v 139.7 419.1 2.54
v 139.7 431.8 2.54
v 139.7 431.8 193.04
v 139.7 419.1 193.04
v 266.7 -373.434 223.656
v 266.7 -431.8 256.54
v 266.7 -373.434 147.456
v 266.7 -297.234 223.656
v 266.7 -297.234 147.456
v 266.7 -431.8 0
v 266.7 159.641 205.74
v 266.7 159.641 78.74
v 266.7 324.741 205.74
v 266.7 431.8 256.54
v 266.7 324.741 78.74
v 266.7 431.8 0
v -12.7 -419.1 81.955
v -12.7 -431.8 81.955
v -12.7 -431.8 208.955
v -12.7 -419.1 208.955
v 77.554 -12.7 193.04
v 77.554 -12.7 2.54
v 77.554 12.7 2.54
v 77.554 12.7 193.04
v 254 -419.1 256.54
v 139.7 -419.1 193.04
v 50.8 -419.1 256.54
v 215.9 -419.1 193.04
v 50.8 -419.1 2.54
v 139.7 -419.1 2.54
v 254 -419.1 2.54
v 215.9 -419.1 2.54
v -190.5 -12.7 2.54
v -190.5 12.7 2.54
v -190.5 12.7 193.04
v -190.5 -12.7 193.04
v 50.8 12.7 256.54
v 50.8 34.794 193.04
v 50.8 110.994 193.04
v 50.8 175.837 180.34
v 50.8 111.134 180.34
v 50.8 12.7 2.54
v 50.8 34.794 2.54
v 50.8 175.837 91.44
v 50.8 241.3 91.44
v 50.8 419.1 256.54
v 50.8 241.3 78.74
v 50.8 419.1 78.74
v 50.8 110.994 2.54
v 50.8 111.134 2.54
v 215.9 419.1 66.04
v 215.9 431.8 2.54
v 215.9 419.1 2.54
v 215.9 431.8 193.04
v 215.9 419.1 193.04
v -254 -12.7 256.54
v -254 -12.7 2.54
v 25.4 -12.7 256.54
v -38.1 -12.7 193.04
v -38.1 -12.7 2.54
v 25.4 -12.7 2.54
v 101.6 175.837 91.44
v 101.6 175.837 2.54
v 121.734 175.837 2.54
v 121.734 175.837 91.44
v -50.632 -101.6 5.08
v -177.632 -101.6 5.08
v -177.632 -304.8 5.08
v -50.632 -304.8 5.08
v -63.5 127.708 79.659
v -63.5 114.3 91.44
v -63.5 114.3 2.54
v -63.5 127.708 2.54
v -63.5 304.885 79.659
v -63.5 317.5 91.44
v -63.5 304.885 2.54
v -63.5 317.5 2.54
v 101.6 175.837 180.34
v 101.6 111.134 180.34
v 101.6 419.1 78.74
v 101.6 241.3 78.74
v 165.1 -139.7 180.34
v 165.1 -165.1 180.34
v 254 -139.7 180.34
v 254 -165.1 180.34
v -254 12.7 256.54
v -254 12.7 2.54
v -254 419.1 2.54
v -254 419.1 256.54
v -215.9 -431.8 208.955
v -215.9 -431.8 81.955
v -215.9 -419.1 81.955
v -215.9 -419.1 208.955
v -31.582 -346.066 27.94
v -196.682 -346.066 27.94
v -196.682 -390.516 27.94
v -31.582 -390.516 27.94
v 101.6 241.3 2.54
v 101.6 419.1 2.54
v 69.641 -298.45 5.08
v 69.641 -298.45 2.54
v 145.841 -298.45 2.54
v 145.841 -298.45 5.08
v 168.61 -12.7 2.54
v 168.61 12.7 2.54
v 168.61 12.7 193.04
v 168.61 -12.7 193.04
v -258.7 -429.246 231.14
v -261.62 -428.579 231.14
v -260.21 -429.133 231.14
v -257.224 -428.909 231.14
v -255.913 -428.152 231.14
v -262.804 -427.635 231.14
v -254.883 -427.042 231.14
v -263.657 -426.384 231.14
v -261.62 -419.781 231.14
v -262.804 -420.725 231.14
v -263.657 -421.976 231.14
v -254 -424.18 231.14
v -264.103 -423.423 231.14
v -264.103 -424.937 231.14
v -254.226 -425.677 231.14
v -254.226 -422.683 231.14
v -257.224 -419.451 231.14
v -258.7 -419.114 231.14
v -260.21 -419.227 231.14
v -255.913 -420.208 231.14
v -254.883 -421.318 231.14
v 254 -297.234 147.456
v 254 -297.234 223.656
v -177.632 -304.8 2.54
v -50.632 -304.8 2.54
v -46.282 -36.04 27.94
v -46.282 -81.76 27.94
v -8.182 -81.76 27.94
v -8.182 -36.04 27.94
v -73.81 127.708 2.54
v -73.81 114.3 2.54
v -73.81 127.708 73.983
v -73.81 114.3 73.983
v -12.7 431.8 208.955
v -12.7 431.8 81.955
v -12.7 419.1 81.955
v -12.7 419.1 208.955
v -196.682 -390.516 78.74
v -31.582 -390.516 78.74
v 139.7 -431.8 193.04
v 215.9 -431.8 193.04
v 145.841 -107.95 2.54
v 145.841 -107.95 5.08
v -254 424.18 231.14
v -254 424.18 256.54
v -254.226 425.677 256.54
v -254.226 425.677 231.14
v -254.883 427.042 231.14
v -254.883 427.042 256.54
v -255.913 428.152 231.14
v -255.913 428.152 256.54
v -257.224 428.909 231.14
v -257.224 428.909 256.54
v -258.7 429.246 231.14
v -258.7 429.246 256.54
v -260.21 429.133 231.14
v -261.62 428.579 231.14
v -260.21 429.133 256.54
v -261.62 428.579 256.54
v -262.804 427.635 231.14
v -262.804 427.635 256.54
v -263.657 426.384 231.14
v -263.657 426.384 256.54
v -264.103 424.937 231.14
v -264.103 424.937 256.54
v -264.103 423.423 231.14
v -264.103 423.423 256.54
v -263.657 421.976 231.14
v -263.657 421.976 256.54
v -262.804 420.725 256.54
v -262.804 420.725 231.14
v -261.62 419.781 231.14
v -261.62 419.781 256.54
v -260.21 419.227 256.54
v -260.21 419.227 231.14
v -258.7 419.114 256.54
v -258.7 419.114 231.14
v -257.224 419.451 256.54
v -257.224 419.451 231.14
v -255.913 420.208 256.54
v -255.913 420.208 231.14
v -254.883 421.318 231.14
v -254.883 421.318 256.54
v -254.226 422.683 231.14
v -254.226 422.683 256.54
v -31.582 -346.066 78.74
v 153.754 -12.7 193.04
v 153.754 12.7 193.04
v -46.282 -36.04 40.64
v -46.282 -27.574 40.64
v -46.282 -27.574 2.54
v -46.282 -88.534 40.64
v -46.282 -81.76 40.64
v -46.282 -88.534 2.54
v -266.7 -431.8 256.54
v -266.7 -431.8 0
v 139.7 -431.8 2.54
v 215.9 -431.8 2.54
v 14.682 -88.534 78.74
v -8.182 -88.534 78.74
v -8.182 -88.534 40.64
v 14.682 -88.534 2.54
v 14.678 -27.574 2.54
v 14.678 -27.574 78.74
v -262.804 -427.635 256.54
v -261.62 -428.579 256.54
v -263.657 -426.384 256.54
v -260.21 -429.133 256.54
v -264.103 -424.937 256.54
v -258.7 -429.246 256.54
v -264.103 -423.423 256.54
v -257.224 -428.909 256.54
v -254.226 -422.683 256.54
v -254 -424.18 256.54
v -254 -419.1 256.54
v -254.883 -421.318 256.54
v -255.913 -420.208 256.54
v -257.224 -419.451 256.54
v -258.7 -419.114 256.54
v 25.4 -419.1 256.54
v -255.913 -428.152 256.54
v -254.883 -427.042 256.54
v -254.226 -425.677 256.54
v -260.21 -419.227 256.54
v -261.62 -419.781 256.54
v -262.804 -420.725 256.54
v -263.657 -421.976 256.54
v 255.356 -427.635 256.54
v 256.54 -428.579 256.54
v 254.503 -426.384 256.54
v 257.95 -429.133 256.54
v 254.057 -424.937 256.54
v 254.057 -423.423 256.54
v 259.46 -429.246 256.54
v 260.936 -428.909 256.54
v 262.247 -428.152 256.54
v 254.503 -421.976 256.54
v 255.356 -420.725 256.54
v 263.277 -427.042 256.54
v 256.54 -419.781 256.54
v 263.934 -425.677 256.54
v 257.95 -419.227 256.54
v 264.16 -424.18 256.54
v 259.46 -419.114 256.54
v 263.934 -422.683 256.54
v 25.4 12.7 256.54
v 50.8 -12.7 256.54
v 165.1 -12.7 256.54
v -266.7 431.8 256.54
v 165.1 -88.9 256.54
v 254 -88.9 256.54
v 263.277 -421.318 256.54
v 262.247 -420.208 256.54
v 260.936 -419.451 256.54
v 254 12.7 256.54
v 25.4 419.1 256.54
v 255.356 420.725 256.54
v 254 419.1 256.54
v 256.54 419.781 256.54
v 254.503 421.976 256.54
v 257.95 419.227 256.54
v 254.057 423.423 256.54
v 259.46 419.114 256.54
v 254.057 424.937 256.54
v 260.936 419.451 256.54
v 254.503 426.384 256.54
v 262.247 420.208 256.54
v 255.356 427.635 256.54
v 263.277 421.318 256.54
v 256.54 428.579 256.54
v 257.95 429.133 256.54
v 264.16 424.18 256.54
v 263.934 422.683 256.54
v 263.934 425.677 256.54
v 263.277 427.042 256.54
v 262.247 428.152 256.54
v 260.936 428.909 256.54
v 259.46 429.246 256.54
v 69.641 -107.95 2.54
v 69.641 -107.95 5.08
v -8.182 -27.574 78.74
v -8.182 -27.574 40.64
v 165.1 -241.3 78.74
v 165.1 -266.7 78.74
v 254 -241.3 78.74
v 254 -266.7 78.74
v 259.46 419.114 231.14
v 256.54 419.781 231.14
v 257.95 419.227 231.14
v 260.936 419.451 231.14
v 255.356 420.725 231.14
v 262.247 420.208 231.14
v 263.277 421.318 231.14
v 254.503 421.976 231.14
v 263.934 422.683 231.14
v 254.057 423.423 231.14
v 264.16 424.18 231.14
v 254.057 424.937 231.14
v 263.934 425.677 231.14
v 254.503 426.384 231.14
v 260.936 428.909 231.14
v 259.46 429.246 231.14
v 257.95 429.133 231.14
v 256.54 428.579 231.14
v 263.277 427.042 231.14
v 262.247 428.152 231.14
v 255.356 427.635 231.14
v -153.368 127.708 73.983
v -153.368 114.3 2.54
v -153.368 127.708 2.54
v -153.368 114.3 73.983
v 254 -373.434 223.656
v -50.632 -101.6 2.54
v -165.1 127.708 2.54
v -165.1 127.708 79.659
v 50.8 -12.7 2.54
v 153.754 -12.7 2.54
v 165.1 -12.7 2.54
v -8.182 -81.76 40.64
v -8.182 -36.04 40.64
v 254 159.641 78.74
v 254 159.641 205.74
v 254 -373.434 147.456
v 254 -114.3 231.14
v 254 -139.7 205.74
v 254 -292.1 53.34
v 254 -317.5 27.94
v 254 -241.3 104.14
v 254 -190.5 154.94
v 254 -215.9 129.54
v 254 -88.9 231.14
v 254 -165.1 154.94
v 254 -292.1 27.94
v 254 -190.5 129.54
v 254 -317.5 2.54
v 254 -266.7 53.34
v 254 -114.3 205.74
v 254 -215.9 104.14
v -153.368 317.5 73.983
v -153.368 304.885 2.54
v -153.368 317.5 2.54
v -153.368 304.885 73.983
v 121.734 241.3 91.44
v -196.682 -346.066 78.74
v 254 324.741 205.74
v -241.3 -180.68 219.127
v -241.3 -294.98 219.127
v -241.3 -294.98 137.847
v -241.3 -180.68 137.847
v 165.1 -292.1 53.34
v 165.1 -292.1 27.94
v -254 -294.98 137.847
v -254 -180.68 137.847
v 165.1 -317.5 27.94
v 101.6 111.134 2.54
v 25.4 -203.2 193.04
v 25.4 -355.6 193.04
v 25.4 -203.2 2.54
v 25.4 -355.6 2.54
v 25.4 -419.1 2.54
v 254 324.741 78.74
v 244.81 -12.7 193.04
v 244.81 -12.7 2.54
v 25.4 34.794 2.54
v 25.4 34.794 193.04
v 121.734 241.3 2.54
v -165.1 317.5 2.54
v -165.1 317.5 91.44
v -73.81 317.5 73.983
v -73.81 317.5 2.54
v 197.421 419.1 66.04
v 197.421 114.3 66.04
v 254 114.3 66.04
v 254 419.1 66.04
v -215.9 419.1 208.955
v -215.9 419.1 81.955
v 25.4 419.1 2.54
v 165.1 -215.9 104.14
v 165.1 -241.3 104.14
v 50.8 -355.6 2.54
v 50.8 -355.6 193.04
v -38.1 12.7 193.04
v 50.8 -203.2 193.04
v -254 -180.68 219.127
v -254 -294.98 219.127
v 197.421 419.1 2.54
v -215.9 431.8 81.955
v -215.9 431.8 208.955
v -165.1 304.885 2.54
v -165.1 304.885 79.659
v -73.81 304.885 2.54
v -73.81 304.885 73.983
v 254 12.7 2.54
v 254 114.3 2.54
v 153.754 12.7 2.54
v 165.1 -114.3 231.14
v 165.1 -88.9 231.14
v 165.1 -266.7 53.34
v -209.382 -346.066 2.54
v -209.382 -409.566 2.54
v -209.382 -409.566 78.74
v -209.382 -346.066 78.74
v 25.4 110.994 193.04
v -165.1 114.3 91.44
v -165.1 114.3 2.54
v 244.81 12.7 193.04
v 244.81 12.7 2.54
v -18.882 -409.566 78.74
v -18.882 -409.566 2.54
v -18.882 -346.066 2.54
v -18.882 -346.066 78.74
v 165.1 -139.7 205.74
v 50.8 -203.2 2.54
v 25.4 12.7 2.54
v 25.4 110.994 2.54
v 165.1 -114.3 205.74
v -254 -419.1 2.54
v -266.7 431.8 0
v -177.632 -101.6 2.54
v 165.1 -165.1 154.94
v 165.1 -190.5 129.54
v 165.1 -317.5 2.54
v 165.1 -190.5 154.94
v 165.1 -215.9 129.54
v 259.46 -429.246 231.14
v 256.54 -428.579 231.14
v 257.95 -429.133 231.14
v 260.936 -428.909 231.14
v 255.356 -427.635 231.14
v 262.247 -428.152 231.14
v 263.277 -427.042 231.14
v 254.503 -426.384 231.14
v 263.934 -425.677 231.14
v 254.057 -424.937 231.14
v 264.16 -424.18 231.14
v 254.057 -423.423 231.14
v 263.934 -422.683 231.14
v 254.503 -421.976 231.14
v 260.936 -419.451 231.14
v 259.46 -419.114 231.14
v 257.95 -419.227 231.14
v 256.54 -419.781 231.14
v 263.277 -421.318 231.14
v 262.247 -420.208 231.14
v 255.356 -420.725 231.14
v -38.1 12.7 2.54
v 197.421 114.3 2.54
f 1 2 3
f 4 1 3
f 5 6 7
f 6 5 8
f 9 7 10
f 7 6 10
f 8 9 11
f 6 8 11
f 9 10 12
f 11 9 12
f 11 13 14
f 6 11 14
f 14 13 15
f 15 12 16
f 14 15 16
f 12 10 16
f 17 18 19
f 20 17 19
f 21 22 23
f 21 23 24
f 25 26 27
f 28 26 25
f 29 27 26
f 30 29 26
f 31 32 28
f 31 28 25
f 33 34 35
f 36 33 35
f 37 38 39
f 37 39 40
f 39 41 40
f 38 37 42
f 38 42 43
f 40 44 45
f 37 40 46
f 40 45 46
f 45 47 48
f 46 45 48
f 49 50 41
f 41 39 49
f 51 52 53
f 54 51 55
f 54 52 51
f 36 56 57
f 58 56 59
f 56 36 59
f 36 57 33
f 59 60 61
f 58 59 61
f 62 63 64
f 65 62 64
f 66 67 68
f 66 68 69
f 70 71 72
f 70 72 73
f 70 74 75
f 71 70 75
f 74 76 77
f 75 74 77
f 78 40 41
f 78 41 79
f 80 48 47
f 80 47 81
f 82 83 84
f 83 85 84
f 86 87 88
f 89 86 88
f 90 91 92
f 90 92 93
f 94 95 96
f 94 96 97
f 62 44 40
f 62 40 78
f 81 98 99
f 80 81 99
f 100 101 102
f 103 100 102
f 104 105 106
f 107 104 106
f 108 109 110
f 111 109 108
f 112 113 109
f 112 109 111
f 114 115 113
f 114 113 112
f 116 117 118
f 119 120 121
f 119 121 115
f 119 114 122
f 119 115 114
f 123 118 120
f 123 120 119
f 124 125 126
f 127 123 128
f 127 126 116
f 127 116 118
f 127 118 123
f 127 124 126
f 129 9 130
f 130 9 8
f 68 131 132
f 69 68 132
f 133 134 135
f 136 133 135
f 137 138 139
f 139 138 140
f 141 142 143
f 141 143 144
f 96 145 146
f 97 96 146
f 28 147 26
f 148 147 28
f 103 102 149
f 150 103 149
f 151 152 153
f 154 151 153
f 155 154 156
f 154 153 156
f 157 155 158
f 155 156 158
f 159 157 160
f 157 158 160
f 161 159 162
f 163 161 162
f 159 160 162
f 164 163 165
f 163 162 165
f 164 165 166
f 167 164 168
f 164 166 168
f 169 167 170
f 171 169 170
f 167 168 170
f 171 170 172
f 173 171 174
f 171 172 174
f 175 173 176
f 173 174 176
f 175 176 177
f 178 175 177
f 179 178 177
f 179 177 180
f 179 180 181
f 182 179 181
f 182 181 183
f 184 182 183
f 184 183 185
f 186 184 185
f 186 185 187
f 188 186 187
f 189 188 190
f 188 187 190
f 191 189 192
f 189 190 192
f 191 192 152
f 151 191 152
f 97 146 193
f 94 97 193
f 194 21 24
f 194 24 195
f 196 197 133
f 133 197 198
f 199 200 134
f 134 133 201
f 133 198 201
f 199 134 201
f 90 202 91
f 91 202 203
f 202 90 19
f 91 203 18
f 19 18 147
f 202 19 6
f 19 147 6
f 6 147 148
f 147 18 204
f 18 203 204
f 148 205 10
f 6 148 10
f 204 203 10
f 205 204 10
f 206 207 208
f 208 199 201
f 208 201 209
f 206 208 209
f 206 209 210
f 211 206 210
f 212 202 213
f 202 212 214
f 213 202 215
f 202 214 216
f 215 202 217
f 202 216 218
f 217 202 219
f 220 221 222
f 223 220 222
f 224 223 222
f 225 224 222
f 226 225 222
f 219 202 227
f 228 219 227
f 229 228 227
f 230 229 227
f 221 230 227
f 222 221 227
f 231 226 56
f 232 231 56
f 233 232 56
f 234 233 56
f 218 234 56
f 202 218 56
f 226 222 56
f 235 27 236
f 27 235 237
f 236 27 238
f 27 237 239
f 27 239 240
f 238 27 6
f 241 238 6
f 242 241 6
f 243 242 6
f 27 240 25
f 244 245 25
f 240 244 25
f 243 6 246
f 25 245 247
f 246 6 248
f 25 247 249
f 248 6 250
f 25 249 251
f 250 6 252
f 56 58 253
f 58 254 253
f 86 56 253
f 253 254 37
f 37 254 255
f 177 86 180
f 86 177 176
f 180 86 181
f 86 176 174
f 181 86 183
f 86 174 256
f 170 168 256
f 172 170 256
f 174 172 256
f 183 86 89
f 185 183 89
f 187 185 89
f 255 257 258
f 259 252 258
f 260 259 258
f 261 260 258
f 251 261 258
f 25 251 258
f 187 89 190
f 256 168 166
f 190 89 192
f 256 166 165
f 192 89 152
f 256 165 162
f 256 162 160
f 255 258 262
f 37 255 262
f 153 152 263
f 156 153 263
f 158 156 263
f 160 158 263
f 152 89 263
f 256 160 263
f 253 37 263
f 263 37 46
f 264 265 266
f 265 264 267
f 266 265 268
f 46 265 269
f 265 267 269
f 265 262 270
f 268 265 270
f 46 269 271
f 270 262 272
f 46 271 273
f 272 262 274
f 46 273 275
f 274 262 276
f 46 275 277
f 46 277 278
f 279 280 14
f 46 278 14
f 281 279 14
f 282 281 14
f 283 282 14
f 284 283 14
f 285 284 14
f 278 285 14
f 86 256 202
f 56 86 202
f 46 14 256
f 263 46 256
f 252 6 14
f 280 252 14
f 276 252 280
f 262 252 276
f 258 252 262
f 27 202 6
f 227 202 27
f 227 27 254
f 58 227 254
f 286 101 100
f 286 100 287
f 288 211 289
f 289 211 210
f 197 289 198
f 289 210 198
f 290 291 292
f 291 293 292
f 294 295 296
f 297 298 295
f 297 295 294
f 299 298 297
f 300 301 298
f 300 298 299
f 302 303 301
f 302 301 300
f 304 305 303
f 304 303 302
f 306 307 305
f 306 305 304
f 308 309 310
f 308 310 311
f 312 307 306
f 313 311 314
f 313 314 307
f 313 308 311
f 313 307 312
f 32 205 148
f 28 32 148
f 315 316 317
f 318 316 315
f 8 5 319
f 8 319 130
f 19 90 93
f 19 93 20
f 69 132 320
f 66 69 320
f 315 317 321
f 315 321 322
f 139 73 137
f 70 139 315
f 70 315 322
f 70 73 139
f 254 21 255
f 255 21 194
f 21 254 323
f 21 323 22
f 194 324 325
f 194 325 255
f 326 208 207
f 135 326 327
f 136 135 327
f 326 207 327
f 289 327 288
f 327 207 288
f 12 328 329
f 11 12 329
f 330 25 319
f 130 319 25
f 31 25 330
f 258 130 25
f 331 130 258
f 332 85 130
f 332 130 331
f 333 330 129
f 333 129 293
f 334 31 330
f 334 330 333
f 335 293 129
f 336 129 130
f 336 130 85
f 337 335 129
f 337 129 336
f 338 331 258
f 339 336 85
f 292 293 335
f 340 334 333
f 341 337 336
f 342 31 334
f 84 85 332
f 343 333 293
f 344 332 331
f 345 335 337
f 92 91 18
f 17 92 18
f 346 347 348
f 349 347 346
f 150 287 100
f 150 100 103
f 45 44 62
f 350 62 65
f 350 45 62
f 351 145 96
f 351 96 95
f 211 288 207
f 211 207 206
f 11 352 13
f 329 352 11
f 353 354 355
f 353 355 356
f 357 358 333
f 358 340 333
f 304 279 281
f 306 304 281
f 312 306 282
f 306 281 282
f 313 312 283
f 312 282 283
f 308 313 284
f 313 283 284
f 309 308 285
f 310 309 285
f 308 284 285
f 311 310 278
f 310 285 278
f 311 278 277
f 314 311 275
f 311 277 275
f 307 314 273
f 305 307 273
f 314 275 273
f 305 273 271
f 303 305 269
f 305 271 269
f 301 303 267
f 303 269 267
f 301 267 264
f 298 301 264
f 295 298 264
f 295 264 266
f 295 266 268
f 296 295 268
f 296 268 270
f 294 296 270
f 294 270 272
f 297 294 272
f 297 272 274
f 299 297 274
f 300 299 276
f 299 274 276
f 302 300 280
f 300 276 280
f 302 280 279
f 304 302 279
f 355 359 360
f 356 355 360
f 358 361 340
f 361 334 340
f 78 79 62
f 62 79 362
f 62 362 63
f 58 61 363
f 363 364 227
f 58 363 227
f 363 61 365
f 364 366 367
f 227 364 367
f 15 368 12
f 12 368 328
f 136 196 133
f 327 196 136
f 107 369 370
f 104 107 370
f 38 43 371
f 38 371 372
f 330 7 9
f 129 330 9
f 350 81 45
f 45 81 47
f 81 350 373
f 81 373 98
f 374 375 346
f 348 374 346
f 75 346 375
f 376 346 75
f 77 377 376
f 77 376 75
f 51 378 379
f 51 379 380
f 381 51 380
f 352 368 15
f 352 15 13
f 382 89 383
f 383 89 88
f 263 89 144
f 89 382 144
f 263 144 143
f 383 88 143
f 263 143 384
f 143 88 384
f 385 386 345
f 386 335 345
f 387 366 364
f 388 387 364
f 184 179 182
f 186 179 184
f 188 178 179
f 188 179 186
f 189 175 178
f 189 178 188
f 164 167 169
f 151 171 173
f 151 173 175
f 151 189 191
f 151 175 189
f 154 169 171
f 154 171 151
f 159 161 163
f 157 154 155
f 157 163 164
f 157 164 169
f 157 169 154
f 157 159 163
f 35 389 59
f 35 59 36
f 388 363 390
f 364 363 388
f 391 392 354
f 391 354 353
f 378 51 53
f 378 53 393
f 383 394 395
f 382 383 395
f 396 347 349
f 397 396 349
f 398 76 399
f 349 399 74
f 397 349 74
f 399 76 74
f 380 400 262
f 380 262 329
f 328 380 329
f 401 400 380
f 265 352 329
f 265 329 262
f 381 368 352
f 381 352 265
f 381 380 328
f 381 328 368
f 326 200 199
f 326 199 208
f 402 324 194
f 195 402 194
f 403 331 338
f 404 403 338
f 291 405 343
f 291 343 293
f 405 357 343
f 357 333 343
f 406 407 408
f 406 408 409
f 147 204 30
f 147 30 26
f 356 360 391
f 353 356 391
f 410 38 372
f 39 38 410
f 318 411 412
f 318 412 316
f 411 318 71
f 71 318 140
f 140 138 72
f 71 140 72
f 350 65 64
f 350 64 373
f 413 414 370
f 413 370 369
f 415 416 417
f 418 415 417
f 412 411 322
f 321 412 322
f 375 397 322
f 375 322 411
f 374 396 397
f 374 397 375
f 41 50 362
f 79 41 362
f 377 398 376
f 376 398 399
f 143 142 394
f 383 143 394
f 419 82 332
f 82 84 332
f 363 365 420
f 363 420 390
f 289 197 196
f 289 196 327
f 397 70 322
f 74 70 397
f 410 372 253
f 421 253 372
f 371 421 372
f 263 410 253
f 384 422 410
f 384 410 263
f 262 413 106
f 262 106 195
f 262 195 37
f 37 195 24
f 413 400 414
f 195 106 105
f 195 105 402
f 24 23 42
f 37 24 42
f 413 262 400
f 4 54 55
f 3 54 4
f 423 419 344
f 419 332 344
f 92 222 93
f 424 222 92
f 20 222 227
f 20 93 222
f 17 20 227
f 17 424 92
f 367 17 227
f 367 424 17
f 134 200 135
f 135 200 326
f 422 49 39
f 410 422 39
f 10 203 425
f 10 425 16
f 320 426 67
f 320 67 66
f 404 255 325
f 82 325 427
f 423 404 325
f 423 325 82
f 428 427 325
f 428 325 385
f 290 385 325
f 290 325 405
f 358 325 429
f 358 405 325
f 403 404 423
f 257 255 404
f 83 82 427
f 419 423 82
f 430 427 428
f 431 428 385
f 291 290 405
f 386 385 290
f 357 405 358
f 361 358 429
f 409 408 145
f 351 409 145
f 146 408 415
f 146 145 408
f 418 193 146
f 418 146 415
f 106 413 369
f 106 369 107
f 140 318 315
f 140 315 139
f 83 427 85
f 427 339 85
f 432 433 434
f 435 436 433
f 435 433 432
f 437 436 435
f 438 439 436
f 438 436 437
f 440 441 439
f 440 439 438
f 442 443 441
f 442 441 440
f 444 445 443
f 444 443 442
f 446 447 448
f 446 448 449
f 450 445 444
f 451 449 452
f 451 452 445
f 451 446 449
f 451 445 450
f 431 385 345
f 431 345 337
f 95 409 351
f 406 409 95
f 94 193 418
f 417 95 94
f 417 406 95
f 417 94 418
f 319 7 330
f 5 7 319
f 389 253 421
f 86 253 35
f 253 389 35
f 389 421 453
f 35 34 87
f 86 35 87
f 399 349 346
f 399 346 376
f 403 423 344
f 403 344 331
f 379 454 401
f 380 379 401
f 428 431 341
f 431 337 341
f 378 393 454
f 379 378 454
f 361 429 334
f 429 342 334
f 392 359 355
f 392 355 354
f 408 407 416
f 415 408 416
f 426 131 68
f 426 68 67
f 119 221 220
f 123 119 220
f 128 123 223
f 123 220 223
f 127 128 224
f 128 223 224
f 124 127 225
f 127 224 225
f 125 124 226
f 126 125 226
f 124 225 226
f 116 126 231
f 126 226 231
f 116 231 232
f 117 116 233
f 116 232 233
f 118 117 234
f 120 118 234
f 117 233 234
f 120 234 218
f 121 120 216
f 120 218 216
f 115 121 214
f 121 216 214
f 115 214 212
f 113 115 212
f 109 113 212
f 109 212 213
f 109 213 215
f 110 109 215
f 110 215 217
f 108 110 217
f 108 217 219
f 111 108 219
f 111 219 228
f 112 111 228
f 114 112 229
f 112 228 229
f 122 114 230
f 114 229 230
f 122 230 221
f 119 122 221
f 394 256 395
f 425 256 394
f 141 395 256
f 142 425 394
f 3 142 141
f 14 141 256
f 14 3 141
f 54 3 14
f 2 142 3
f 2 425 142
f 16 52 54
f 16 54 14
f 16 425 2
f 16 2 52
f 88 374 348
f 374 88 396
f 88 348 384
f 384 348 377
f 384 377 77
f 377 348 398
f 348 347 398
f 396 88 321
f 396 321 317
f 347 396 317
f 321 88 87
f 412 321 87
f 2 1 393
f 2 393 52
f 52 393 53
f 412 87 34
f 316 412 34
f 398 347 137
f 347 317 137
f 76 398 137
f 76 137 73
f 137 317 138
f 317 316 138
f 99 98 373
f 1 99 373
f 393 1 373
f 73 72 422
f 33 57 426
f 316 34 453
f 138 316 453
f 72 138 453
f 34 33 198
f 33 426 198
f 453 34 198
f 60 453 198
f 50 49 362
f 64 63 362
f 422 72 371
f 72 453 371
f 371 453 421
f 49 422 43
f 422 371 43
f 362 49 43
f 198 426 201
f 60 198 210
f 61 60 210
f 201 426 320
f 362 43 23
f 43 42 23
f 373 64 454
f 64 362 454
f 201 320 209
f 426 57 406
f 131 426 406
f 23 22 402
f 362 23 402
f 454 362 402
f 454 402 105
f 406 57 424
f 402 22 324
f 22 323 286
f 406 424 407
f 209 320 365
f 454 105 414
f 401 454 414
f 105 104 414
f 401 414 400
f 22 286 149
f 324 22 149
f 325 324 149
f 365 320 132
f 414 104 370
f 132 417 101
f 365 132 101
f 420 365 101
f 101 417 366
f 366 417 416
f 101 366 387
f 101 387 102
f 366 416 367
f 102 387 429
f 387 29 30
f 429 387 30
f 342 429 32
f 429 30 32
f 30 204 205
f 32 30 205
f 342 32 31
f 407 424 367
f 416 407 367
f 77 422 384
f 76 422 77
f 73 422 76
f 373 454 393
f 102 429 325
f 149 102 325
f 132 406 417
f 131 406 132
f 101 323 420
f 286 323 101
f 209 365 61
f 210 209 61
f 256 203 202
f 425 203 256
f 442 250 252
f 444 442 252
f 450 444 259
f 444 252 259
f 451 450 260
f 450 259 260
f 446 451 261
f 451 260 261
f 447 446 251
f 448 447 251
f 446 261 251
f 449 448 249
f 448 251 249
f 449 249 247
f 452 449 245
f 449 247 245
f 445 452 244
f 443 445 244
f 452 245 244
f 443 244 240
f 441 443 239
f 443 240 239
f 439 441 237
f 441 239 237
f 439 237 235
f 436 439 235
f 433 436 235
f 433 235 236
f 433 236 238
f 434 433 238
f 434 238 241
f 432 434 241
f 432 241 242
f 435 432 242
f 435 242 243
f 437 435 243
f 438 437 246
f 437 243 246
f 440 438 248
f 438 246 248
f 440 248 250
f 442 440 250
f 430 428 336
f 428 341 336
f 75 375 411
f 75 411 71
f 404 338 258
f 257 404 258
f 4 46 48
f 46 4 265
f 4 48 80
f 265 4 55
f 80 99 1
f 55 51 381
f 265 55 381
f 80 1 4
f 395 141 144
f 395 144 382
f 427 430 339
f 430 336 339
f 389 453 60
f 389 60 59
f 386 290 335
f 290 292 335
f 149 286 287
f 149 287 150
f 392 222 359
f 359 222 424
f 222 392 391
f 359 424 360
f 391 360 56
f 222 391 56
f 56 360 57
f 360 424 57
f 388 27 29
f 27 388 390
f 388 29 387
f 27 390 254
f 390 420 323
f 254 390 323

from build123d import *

# Parameters (mm, degrees)
F0_W      = 533.4
F0_H      = 863.6
F1_DEPTH  = 2.54
F2_W      = 533.4
F2_H      = 863.6
F2_W_2    = 508
F2_H_2    = 838.2
F3_DEPTH  = 254
F4_W      = 25.4
F4_H      = 406.4
F4_H_2    = 25.4
F5_DEPTH  = 254
F6_W      = 76.2
F6_H      = 190.5
F7_DEPTH  = 25.4
F8_W      = 76.2
F8_H      = 304.8
F9_DEPTH  = 25.4
F10_W     = 76.2
F10_H     = 279.4
F11_DEPTH = 25.4
F12_W     = 76.2
F12_H     = 254
F13_DEPTH = 25.4
F14_W     = 76.2
F14_H     = 228.6
F15_DEPTH = 25.4
F16_W     = 76.2
F16_H     = 203.2
F17_DEPTH = 25.4
F18_W     = 76.2
F18_H     = 177.8
F19_DEPTH = 25.4
F20_W     = 76.2
F20_H     = 152.4
F21_DEPTH = 25.4
F22_W     = 76.2
F22_H     = 127
F23_DEPTH = 25.4
F24_W     = 76.2
F24_H     = 101.6
F25_DEPTH = 25.4
F26_W     = 76.2
F26_H     = 76.2
F27_DEPTH = 25.4
F28_W     = 76.2
F28_H     = 190.5
F29_DEPTH = 25.4
F30_W     = 76.2
F30_H     = 190.5
F31_DEPTH = 25.4
F32_W     = 152.4
F32_H     = 190.5
F33_DEPTH = 25.4
F34_W     = 152.4
F34_H     = 190.5
F35_DEPTH = 25.4
F37_W     = 76.2
F37_H     = 76.2
F38_DEPTH = 25.4
F39_W     = 203.2
F39_H     = 127
F40_DEPTH = 25.4
F41_W     = 203.2
F41_H     = 127
F42_DEPTH = 25.4
F43_W     = 76.2
F43_H     = 190.5
F44_DEPTH = 25.4
F45_W     = 76.2
F45_H     = 190.5
F46_DEPTH = 25.4
F48_DEPTH = 12.7
F49_W     = 165.1
F49_H     = 127
F50_DEPTH = 25.4
F51_R     = 5.08
F52_DEPTH = 25.4
F53_W     = 190.5
F53_H     = 63.5
F54_DEPTH = 76.2
F55_W     = 165.1
F55_H     = 44.45
F56_DEPTH = 50.8
F57_W     = 127
F57_H     = 203.2
F57_W_2   = 76.2
F57_H_2   = 190.5
F58_DEPTH = 2.54
F60_DEPTH = 63.5
F61_W     = 50.8
F61_H     = 177.8
F62_DEPTH = 76.2
F64_DEPTH = 88.9
F65_W     = 50.8
F65_H     = 64.7032260895
F66_DEPTH = 177.8
F67_W     = 101.6
F67_H     = 203.2
F68_DEPTH = 88.9
F69_W     = 79.5584097505
F69_H     = 71.4426783538
F70_DEPTH = 203.2
F71_W     = 177.1770715714
F71_H     = 77.1189329839
F72_DEPTH = 101.6
F73_W     = 114.3
F73_H     = 81.28
F74_DEPTH = 12.7
F76_DEPTH = 76.2
F77_W     = 38.1
F77_H     = 45.72
F78_DEPTH = 50.8
F79_W     = 38.1
F79_H     = 8.466582
F79_H_2   = 6.773418
F80_DEPTH = 38.1


with BuildPart() as f1:
    # F0 (on Top) → F1 (new body)
    with BuildSketch(Plane.XY):
        Rectangle(F0_W, F0_H)
    extrude(amount=F1_DEPTH)

    # F2 (on face) → F3 (join)
    with BuildSketch(Plane.XY.offset(2.54)):
        Rectangle(F2_W, F2_H)
        Rectangle(F2_W_2, F2_H_2, mode=Mode.SUBTRACT)
    extrude(amount=F3_DEPTH)

    # F4 (on face) → F5 (join)
    with BuildSketch(Plane.XY.offset(2.54)):
        with Locations((38.1, -215.9)):
            Rectangle(F4_W, F4_H)
        with Locations((38.1, 0)):
            Rectangle(F4_W, F4_H_2)
        Polygon((254, 12.7), (50.8, 12.7), (50.8, -12.7), (254, -12.7), (254, 0), align=None)
        Polygon((25.4, -12.7), (25.4, 12.7), (-254, 12.7), (-254, 0), (-254, -12.7), align=None)
        with Locations((38.1, 215.9)):
            Rectangle(F4_W, F4_H)
    extrude(amount=F5_DEPTH)

    # F6 (on face) → F7 (cut)
    with BuildSketch(Plane.XZ.offset(431.8)):
        with Locations((177.8, 97.79)):
            Rectangle(F6_W, F6_H)
    extrude(amount=-F7_DEPTH, mode=Mode.SUBTRACT)

    # F8 (on face) → F9 (join)
    with BuildSketch(Plane.XY.offset(2.54)):
        with Locations((215.9, -165.1)):
            Rectangle(F8_W, F8_H)
    extrude(amount=F9_DEPTH)

    # F10 (on face) → F11 (join)
    with BuildSketch(Plane.XY.offset(27.94)):
        with Locations((215.9, -152.4)):
            Rectangle(F10_W, F10_H)
    extrude(amount=F11_DEPTH)

    # F12 (on face) → F13 (join)
    with BuildSketch(Plane.XY.offset(53.34)):
        with Locations((215.9, -139.7)):
            Rectangle(F12_W, F12_H)
    extrude(amount=F13_DEPTH)

    # F14 (on face) → F15 (join)
    with BuildSketch(Plane.XY.offset(78.74)):
        with Locations((215.9, -127)):
            Rectangle(F14_W, F14_H)
    extrude(amount=F15_DEPTH)

    # F16 (on face) → F17 (join)
    with BuildSketch(Plane.XY.offset(104.14)):
        with Locations((215.9, -114.3)):
            Rectangle(F16_W, F16_H)
    extrude(amount=F17_DEPTH)

    # F18 (on face) → F19 (join)
    with BuildSketch(Plane.XY.offset(129.54)):
        with Locations((215.9, -101.6)):
            Rectangle(F18_W, F18_H)
    extrude(amount=F19_DEPTH)

    # F20 (on face) → F21 (join)
    with BuildSketch(Plane.XY.offset(154.94)):
        with Locations((215.9, -88.9)):
            Rectangle(F20_W, F20_H)
    extrude(amount=F21_DEPTH)

    # F22 (on face) → F23 (join)
    with BuildSketch(Plane.XY.offset(180.34)):
        with Locations((215.9, -76.2)):
            Rectangle(F22_W, F22_H)
    extrude(amount=F23_DEPTH)

    # F24 (on face) → F25 (join)
    with BuildSketch(Plane.XY.offset(205.74)):
        with Locations((215.9, -63.5)):
            Rectangle(F24_W, F24_H)
    extrude(amount=F25_DEPTH)

    # F26 (on face) → F27 (join)
    with BuildSketch(Plane.XY.offset(231.14)):
        with Locations((215.9, -50.8)):
            Rectangle(F26_W, F26_H)
    extrude(amount=F27_DEPTH)

    # F28 (on face) → F29 (cut)
    with BuildSketch(Plane.XZ.offset(12.7)):
        with Locations((115.6540173054, 97.79)):
            Rectangle(F28_W, F28_H)
    extrude(amount=-F29_DEPTH, mode=Mode.SUBTRACT)

    # F30 (on face) → F31 (cut)
    with BuildSketch(Plane.YZ.offset(50.8)):
        with Locations((72.8943343222, 97.79)):
            Rectangle(F30_W, F30_H)
    extrude(amount=-F31_DEPTH, mode=Mode.SUBTRACT)

    # F32 (on face) → F33 (cut)
    with BuildSketch(Plane(origin=(0, 12.7, 0), x_dir=(-1, 0, 0), z_dir=(0, 1, 0))):
        with Locations((114.3, 97.79)):
            Rectangle(F32_W, F32_H)
    extrude(amount=-F33_DEPTH, mode=Mode.SUBTRACT)

    # F34 (on face) → F35 (cut)
    with BuildSketch(Plane(origin=(25.4, 0, 0), x_dir=(0, -1, 0), z_dir=(-1, 0, 0))):
        with Locations((279.4, 97.79)):
            Rectangle(F34_W, F34_H)
    extrude(amount=-F35_DEPTH, mode=Mode.SUBTRACT)

    # F37 (on face) → F38 (cut)
    with BuildSketch(Plane.YZ.offset(266.7)):
        with Locations((-335.3340667725, 185.5564373493)):
            Rectangle(F37_W, F37_H)
    extrude(amount=-F38_DEPTH, mode=Mode.SUBTRACT)

    # F39 (on face) → F40 (cut)
    with BuildSketch(Plane.XZ.offset(431.8)):
        with Locations((-114.3, 145.4548070431)):
            Rectangle(F39_W, F39_H)
    extrude(amount=-F40_DEPTH, mode=Mode.SUBTRACT)

    # F41 (on face) → F42 (cut)
    with BuildSketch(Plane(origin=(0, 431.8, 0), x_dir=(-1, 0, 0), z_dir=(0, 1, 0))):
        with Locations((114.3, 145.4548070431)):
            Rectangle(F41_W, F41_H)
    extrude(amount=-F42_DEPTH, mode=Mode.SUBTRACT)

    # F43 (on face) → F44 (cut)
    with BuildSketch(Plane(origin=(0, 431.8, 0), x_dir=(-1, 0, 0), z_dir=(0, 1, 0))):
        with Locations((-177.8, 97.79)):
            Rectangle(F43_W, F43_H)
    extrude(amount=-F44_DEPTH, mode=Mode.SUBTRACT)

    # F45 (on face) → F46 (cut)
    with BuildSketch(Plane(origin=(0, 12.7, 0), x_dir=(-1, 0, 0), z_dir=(0, 1, 0))):
        with Locations((-206.7097020388, 97.79)):
            Rectangle(F45_W, F45_H)
    extrude(amount=-F46_DEPTH, mode=Mode.SUBTRACT)

    # F47 (on face) → F48 (join)
    with BuildSketch(Plane(origin=(177.8, 0, 0), x_dir=(0, -1, 0), z_dir=(-1, 0, 0))):
        Polygon((88.9, 231.14), (88.9, 256.54), (12.7, 256.54), (12.7, 193.04), (12.7, 2.54), (317.5, 2.54), (317.5, 27.94), (292.1, 27.94), (292.1, 53.34), (266.7, 53.34), (266.7, 78.74), (241.3, 78.74), (241.3, 104.14), (215.9, 104.14), (215.9, 129.54), (190.5, 129.54), (190.5, 154.94), (165.1, 154.94), (165.1, 180.34), (139.7, 180.34), (139.7, 205.74), (114.3, 205.74), (114.3, 231.14), align=None)
    extrude(amount=F48_DEPTH)

    # F49 (on face) → F50 (cut)
    with BuildSketch(Plane(origin=(254, 0, 0), x_dir=(0, -1, 0), z_dir=(-1, 0, 0))):
        with Locations((-242.1909462929, 142.24)):
            Rectangle(F49_W, F49_H)
    extrude(amount=-F50_DEPTH, mode=Mode.SUBTRACT)

    # F51 (on face) → F52 (cut)
    with BuildSketch(Plane.XY.offset(256.54)):
        with Locations((259.08, -424.18)):
            Circle(F51_R)
        with Locations((-259.08, -424.18)):
            Circle(F51_R)
        with Locations((-259.08, 424.18)):
            Circle(F51_R)
        with Locations((259.08, 424.18)):
            Circle(F51_R)
    extrude(amount=-F52_DEPTH, mode=Mode.SUBTRACT)

    # F53 (on face) → F54 (join)
    with BuildSketch(Plane.XY.offset(2.54)):
        with Locations((-114.1317740679, -377.8158957958)):
            Rectangle(F53_W, F53_H)
    extrude(amount=F54_DEPTH)

    # F55 (on face) → F56 (cut)
    with BuildSketch(Plane.XY.offset(78.74)):
        with Locations((-114.1317740679, -368.2908957958)):
            Rectangle(F55_W, F55_H)
    extrude(amount=-F56_DEPTH, mode=Mode.SUBTRACT)

    # F57 (on face) → F58 (join)
    with BuildSketch(Plane.XY.offset(2.54)):
        with Locations((-114.1317740679, -203.2)):
            Rectangle(F57_W, F57_H)
        with Locations((107.7413304009, -203.2)):
            Rectangle(F57_W_2, F57_H_2)
    extrude(amount=F58_DEPTH)

    # F59 (on face) → F60 (join)
    with BuildSketch(Plane.XY.offset(2.54)):
        Polygon((215.9, 419.1), (197.4212676287, 419.1), (197.4212676287, 114.3), (254, 114.3), (254, 419.1), align=None)
    extrude(amount=F60_DEPTH)

    # F61 (on face) → F62 (join)
    with BuildSketch(Plane.XY.offset(2.54)):
        with Locations((76.2, 330.2)):
            Rectangle(F61_W, F61_H)
    extrude(amount=F62_DEPTH)

    # F63 (on face) → F64 (join)
    with BuildSketch(Plane.XY.offset(2.54)):
        Polygon((121.7336058617, 241.3), (101.6, 241.3), (50.8, 241.3), (50.8, 175.8374124765), (101.6, 175.8374124765), (121.7336058617, 175.8374124765), align=None)
    extrude(amount=F64_DEPTH)

    # F65 (on face) → F66 (join)
    with BuildSketch(Plane.XY.offset(2.54)):
        with Locations((76.2, 143.4857994318)):
            Rectangle(F65_W, F65_H)
    extrude(amount=F66_DEPTH)

    # F67 (on face) → F68 (join)
    with BuildSketch(Plane.XY.offset(2.54)):
        with Locations((-114.3, 215.9)):
            Rectangle(F67_W, F67_H)
    extrude(amount=F68_DEPTH)

    # F69 (on face) → F70 (cut)
    with BuildSketch(Plane.XZ.offset(-114.3)):
        with Locations((-113.5888062418, 38.2613391769)):
            Rectangle(F69_W, F69_H)
    extrude(amount=-F70_DEPTH, mode=Mode.SUBTRACT)

    # F71 (on face) → F72 (cut)
    with BuildSketch(Plane.YZ.offset(-63.5)):
        with Locations((216.2962853909, 41.0994664919)):
            Rectangle(F71_W, F71_H)
    extrude(amount=-F72_DEPTH, mode=Mode.SUBTRACT)

    # F73 (on face) → F74 (join)
    with BuildSketch(Plane.YZ.offset(-254)):
        with Locations((-237.8303322554, 178.4867082977)):
            Rectangle(F73_W, F73_H)
    extrude(amount=F74_DEPTH)

    # F75 (on face) → F76 (join)
    with BuildSketch(Plane.XY.offset(2.54)):
        Polygon((-46.28226161, -88.5335505009), (14.6819874644, -88.5335505009), (14.67773839, -27.5735505009), (-46.28226161, -27.5735505009), align=None)
    extrude(amount=F76_DEPTH)

    # F77 (on face) → F78 (cut)
    with BuildSketch(Plane.XY.offset(78.74)):
        with Locations((-27.23226161, -58.9001325009)):
            Rectangle(F77_W, F77_H)
    extrude(amount=-F78_DEPTH, mode=Mode.SUBTRACT)

    # F79 (on face) → F80 (cut)
    with BuildSketch(Plane.XY.offset(78.74)):
        with Locations((-27.23226161, -31.8068415009)):
            Rectangle(F79_W, F79_H)
        with Locations((-27.23226161, -85.1468415009)):
            Rectangle(F79_W, F79_H_2)
    extrude(amount=-F80_DEPTH, mode=Mode.SUBTRACT)


solid = f1.part
